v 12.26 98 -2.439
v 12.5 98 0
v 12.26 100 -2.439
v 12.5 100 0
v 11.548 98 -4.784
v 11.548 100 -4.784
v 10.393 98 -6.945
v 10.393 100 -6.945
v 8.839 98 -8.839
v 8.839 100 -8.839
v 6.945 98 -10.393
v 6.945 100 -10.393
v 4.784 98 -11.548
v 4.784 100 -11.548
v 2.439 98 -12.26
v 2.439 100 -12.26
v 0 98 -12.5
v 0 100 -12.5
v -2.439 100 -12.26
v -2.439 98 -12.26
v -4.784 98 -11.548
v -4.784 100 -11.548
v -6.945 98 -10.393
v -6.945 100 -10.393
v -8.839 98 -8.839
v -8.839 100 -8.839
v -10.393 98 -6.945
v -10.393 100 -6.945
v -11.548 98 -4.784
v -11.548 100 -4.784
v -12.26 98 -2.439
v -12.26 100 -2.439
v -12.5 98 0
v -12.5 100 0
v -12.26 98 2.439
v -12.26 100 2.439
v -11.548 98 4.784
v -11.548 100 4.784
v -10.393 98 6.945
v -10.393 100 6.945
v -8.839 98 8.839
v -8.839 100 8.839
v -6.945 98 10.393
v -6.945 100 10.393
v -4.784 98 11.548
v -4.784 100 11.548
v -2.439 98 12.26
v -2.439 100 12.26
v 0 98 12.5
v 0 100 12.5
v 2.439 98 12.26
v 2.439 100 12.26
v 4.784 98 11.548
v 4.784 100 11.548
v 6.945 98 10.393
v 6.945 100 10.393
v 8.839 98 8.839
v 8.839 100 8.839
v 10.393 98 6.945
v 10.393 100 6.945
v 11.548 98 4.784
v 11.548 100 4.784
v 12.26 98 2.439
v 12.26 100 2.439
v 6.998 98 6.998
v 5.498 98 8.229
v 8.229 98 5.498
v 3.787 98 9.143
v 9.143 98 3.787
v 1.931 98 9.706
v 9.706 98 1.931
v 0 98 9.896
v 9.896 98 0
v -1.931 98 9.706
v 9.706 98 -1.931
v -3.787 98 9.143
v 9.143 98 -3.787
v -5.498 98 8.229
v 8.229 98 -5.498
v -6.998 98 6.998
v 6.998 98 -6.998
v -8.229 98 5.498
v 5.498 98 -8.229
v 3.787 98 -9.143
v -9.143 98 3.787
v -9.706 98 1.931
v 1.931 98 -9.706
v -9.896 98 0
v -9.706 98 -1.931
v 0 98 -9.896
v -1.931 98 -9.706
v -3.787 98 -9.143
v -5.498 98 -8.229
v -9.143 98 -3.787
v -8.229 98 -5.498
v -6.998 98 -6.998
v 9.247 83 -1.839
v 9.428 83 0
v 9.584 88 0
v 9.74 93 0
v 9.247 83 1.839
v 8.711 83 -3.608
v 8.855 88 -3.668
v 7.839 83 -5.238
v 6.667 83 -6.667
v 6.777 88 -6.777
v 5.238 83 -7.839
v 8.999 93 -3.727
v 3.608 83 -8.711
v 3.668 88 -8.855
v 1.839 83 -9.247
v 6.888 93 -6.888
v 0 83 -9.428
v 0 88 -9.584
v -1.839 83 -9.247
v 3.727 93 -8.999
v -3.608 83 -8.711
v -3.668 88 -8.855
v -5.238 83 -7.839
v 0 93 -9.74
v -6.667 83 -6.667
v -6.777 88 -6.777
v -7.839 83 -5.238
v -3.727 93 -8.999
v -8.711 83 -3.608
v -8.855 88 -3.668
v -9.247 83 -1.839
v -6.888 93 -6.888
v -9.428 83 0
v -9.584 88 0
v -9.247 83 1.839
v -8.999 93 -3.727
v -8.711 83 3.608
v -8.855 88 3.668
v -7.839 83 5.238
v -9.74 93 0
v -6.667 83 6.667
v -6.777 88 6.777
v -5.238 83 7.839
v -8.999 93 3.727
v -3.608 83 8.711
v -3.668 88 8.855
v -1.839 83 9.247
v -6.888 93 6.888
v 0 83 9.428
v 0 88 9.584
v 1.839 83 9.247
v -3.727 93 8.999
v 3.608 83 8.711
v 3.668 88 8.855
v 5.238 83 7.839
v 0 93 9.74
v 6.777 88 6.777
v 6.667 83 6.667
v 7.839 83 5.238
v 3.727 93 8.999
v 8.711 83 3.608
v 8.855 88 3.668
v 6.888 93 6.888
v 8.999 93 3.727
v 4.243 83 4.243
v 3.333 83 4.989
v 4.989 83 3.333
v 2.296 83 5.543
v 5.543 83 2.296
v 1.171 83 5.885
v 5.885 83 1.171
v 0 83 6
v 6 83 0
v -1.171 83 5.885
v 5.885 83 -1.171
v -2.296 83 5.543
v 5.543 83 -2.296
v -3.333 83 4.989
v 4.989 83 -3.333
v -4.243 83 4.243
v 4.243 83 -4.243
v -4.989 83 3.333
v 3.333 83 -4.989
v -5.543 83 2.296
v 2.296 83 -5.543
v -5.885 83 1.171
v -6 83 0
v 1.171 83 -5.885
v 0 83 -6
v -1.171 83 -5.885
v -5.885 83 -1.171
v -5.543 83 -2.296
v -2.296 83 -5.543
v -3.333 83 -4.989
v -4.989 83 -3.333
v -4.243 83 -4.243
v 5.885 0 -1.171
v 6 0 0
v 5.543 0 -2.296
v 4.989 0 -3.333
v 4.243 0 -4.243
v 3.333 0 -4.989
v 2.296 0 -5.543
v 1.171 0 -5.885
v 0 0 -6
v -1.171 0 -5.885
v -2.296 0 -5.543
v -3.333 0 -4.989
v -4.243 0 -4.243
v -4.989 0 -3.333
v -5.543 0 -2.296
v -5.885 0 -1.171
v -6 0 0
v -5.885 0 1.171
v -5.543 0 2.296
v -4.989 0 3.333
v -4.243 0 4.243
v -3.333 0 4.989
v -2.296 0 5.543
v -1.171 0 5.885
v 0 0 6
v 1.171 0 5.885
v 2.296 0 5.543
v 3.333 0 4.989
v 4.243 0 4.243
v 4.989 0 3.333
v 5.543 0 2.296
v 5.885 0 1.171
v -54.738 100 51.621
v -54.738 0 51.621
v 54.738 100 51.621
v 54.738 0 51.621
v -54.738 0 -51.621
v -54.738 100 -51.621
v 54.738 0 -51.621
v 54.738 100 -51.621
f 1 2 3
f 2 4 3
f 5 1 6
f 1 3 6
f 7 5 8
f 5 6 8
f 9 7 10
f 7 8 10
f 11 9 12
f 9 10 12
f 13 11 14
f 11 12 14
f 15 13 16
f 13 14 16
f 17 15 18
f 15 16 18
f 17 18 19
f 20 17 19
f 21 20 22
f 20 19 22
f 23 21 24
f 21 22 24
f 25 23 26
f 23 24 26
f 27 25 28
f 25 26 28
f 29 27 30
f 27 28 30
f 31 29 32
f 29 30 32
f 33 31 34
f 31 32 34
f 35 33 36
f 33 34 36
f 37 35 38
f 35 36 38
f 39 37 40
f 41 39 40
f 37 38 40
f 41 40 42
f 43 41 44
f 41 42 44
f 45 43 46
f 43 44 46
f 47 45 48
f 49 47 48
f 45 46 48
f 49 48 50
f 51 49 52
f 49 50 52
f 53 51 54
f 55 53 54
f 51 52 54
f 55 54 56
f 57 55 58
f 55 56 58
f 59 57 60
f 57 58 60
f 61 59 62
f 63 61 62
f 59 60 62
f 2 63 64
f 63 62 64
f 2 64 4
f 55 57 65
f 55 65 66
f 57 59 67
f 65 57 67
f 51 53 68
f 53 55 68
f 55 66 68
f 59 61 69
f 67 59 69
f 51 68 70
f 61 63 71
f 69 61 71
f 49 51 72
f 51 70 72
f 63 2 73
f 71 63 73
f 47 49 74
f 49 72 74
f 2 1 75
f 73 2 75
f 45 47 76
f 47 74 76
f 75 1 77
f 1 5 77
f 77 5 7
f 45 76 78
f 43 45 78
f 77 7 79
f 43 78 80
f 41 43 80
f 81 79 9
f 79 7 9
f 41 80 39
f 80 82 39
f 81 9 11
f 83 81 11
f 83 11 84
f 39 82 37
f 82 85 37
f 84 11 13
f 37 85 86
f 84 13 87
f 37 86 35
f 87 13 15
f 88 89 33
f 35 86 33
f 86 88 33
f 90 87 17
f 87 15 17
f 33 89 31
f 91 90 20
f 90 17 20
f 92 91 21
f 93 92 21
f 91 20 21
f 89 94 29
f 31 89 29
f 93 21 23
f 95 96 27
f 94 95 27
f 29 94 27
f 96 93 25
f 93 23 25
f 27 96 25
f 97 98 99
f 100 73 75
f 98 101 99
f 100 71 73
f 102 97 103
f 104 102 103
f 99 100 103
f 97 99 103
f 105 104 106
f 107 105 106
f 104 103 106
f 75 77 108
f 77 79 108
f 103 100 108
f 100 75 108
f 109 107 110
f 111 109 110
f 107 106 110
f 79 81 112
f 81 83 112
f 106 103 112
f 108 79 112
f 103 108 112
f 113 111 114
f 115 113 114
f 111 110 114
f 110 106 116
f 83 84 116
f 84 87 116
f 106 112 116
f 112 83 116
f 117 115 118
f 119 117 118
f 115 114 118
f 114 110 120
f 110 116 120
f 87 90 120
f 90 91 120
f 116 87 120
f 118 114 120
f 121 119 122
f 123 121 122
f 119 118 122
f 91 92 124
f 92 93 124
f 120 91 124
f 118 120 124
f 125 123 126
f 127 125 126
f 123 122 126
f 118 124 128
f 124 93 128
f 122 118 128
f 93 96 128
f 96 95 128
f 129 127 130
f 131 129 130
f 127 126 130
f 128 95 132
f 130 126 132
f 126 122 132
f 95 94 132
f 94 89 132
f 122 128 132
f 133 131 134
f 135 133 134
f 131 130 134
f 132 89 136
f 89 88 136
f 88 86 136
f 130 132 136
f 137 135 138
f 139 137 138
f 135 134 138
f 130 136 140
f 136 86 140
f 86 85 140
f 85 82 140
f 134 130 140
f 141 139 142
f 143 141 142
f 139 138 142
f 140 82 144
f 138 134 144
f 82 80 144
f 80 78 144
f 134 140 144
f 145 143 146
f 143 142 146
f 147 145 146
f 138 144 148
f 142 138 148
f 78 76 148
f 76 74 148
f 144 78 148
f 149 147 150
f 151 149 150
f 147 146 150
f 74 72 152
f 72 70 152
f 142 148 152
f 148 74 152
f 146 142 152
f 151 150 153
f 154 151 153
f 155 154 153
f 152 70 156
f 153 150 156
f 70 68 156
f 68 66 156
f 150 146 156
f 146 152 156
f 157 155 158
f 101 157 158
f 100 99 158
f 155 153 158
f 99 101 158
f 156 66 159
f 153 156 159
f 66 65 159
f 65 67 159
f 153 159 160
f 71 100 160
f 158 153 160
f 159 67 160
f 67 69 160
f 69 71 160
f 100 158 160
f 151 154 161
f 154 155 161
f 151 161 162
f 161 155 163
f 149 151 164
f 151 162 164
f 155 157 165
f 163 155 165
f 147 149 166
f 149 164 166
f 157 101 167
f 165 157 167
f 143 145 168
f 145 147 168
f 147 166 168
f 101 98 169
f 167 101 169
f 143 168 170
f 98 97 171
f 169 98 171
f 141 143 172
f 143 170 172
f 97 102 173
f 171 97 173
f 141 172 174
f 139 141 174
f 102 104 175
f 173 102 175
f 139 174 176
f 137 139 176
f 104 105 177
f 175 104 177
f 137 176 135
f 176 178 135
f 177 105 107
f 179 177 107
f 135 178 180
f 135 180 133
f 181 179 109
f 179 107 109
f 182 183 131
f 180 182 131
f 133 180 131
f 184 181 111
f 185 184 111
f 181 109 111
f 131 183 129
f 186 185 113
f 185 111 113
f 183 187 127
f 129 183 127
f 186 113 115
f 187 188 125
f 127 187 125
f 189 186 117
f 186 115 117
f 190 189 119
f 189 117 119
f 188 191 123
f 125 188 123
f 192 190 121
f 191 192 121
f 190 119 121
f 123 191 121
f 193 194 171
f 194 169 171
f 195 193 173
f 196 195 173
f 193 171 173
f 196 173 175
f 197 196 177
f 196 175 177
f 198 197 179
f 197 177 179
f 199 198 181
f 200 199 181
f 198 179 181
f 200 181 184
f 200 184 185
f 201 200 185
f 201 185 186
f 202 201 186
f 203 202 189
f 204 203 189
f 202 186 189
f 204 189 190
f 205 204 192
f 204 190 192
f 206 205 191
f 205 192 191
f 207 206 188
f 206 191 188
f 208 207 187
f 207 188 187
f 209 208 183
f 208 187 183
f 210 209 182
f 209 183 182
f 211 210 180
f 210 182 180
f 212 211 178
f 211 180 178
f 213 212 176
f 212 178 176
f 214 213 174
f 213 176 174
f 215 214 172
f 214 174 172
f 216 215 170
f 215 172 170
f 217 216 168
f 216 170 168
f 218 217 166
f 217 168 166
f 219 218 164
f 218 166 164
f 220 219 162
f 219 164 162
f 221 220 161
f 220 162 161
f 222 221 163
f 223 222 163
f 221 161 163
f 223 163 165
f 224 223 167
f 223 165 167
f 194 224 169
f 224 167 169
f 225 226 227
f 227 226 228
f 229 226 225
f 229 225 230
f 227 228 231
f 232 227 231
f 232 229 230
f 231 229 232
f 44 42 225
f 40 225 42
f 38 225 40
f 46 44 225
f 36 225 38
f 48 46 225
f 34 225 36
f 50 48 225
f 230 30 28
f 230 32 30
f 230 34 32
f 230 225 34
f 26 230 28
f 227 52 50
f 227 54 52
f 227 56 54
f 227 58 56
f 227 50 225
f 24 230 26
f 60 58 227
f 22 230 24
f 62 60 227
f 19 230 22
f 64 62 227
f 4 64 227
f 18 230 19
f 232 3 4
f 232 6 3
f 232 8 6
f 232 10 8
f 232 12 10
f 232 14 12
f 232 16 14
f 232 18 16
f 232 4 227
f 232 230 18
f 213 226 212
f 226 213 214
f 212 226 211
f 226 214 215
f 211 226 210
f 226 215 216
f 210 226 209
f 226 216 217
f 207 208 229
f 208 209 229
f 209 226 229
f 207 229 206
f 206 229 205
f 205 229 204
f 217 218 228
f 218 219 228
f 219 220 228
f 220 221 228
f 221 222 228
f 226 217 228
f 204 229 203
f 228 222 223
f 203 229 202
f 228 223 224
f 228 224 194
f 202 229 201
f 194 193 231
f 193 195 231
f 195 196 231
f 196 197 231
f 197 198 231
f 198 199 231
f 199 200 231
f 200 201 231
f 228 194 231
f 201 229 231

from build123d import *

# Parameters (mm, degrees)
SKETCH1_W           = 109.475312552
SKETCH1_H           = 103.242807134
BOSS_EXTRUDE1_DEPTH = 100


# Read off the part's stored shape, not the designer's step: AdvancedHole2
with BuildPart() as part:
    # Sketch1 → Boss-Extrude1 (new body)
    with BuildSketch(Plane(origin=(0, 0, 0), x_dir=(1, 0, 0), z_dir=(0, 1, 0))):
        Rectangle(SKETCH1_W, SKETCH1_H)
    extrude(amount=BOSS_EXTRUDE1_DEPTH)

    # AdvancedHole2 outline → AdvancedHole2 (revolve, cut)
    with BuildSketch(Plane.XY):
        Polygon((9.8965, 98), (12.5, 98), (12.5, 100), (0, 100), (0, 0), (6, 0), (6, 83), (9.428250684, 83), align=None)
    revolve(axis=Axis((0, 0, 0), (0, 1, 0)), mode=Mode.SUBTRACT)


solid = part.part
